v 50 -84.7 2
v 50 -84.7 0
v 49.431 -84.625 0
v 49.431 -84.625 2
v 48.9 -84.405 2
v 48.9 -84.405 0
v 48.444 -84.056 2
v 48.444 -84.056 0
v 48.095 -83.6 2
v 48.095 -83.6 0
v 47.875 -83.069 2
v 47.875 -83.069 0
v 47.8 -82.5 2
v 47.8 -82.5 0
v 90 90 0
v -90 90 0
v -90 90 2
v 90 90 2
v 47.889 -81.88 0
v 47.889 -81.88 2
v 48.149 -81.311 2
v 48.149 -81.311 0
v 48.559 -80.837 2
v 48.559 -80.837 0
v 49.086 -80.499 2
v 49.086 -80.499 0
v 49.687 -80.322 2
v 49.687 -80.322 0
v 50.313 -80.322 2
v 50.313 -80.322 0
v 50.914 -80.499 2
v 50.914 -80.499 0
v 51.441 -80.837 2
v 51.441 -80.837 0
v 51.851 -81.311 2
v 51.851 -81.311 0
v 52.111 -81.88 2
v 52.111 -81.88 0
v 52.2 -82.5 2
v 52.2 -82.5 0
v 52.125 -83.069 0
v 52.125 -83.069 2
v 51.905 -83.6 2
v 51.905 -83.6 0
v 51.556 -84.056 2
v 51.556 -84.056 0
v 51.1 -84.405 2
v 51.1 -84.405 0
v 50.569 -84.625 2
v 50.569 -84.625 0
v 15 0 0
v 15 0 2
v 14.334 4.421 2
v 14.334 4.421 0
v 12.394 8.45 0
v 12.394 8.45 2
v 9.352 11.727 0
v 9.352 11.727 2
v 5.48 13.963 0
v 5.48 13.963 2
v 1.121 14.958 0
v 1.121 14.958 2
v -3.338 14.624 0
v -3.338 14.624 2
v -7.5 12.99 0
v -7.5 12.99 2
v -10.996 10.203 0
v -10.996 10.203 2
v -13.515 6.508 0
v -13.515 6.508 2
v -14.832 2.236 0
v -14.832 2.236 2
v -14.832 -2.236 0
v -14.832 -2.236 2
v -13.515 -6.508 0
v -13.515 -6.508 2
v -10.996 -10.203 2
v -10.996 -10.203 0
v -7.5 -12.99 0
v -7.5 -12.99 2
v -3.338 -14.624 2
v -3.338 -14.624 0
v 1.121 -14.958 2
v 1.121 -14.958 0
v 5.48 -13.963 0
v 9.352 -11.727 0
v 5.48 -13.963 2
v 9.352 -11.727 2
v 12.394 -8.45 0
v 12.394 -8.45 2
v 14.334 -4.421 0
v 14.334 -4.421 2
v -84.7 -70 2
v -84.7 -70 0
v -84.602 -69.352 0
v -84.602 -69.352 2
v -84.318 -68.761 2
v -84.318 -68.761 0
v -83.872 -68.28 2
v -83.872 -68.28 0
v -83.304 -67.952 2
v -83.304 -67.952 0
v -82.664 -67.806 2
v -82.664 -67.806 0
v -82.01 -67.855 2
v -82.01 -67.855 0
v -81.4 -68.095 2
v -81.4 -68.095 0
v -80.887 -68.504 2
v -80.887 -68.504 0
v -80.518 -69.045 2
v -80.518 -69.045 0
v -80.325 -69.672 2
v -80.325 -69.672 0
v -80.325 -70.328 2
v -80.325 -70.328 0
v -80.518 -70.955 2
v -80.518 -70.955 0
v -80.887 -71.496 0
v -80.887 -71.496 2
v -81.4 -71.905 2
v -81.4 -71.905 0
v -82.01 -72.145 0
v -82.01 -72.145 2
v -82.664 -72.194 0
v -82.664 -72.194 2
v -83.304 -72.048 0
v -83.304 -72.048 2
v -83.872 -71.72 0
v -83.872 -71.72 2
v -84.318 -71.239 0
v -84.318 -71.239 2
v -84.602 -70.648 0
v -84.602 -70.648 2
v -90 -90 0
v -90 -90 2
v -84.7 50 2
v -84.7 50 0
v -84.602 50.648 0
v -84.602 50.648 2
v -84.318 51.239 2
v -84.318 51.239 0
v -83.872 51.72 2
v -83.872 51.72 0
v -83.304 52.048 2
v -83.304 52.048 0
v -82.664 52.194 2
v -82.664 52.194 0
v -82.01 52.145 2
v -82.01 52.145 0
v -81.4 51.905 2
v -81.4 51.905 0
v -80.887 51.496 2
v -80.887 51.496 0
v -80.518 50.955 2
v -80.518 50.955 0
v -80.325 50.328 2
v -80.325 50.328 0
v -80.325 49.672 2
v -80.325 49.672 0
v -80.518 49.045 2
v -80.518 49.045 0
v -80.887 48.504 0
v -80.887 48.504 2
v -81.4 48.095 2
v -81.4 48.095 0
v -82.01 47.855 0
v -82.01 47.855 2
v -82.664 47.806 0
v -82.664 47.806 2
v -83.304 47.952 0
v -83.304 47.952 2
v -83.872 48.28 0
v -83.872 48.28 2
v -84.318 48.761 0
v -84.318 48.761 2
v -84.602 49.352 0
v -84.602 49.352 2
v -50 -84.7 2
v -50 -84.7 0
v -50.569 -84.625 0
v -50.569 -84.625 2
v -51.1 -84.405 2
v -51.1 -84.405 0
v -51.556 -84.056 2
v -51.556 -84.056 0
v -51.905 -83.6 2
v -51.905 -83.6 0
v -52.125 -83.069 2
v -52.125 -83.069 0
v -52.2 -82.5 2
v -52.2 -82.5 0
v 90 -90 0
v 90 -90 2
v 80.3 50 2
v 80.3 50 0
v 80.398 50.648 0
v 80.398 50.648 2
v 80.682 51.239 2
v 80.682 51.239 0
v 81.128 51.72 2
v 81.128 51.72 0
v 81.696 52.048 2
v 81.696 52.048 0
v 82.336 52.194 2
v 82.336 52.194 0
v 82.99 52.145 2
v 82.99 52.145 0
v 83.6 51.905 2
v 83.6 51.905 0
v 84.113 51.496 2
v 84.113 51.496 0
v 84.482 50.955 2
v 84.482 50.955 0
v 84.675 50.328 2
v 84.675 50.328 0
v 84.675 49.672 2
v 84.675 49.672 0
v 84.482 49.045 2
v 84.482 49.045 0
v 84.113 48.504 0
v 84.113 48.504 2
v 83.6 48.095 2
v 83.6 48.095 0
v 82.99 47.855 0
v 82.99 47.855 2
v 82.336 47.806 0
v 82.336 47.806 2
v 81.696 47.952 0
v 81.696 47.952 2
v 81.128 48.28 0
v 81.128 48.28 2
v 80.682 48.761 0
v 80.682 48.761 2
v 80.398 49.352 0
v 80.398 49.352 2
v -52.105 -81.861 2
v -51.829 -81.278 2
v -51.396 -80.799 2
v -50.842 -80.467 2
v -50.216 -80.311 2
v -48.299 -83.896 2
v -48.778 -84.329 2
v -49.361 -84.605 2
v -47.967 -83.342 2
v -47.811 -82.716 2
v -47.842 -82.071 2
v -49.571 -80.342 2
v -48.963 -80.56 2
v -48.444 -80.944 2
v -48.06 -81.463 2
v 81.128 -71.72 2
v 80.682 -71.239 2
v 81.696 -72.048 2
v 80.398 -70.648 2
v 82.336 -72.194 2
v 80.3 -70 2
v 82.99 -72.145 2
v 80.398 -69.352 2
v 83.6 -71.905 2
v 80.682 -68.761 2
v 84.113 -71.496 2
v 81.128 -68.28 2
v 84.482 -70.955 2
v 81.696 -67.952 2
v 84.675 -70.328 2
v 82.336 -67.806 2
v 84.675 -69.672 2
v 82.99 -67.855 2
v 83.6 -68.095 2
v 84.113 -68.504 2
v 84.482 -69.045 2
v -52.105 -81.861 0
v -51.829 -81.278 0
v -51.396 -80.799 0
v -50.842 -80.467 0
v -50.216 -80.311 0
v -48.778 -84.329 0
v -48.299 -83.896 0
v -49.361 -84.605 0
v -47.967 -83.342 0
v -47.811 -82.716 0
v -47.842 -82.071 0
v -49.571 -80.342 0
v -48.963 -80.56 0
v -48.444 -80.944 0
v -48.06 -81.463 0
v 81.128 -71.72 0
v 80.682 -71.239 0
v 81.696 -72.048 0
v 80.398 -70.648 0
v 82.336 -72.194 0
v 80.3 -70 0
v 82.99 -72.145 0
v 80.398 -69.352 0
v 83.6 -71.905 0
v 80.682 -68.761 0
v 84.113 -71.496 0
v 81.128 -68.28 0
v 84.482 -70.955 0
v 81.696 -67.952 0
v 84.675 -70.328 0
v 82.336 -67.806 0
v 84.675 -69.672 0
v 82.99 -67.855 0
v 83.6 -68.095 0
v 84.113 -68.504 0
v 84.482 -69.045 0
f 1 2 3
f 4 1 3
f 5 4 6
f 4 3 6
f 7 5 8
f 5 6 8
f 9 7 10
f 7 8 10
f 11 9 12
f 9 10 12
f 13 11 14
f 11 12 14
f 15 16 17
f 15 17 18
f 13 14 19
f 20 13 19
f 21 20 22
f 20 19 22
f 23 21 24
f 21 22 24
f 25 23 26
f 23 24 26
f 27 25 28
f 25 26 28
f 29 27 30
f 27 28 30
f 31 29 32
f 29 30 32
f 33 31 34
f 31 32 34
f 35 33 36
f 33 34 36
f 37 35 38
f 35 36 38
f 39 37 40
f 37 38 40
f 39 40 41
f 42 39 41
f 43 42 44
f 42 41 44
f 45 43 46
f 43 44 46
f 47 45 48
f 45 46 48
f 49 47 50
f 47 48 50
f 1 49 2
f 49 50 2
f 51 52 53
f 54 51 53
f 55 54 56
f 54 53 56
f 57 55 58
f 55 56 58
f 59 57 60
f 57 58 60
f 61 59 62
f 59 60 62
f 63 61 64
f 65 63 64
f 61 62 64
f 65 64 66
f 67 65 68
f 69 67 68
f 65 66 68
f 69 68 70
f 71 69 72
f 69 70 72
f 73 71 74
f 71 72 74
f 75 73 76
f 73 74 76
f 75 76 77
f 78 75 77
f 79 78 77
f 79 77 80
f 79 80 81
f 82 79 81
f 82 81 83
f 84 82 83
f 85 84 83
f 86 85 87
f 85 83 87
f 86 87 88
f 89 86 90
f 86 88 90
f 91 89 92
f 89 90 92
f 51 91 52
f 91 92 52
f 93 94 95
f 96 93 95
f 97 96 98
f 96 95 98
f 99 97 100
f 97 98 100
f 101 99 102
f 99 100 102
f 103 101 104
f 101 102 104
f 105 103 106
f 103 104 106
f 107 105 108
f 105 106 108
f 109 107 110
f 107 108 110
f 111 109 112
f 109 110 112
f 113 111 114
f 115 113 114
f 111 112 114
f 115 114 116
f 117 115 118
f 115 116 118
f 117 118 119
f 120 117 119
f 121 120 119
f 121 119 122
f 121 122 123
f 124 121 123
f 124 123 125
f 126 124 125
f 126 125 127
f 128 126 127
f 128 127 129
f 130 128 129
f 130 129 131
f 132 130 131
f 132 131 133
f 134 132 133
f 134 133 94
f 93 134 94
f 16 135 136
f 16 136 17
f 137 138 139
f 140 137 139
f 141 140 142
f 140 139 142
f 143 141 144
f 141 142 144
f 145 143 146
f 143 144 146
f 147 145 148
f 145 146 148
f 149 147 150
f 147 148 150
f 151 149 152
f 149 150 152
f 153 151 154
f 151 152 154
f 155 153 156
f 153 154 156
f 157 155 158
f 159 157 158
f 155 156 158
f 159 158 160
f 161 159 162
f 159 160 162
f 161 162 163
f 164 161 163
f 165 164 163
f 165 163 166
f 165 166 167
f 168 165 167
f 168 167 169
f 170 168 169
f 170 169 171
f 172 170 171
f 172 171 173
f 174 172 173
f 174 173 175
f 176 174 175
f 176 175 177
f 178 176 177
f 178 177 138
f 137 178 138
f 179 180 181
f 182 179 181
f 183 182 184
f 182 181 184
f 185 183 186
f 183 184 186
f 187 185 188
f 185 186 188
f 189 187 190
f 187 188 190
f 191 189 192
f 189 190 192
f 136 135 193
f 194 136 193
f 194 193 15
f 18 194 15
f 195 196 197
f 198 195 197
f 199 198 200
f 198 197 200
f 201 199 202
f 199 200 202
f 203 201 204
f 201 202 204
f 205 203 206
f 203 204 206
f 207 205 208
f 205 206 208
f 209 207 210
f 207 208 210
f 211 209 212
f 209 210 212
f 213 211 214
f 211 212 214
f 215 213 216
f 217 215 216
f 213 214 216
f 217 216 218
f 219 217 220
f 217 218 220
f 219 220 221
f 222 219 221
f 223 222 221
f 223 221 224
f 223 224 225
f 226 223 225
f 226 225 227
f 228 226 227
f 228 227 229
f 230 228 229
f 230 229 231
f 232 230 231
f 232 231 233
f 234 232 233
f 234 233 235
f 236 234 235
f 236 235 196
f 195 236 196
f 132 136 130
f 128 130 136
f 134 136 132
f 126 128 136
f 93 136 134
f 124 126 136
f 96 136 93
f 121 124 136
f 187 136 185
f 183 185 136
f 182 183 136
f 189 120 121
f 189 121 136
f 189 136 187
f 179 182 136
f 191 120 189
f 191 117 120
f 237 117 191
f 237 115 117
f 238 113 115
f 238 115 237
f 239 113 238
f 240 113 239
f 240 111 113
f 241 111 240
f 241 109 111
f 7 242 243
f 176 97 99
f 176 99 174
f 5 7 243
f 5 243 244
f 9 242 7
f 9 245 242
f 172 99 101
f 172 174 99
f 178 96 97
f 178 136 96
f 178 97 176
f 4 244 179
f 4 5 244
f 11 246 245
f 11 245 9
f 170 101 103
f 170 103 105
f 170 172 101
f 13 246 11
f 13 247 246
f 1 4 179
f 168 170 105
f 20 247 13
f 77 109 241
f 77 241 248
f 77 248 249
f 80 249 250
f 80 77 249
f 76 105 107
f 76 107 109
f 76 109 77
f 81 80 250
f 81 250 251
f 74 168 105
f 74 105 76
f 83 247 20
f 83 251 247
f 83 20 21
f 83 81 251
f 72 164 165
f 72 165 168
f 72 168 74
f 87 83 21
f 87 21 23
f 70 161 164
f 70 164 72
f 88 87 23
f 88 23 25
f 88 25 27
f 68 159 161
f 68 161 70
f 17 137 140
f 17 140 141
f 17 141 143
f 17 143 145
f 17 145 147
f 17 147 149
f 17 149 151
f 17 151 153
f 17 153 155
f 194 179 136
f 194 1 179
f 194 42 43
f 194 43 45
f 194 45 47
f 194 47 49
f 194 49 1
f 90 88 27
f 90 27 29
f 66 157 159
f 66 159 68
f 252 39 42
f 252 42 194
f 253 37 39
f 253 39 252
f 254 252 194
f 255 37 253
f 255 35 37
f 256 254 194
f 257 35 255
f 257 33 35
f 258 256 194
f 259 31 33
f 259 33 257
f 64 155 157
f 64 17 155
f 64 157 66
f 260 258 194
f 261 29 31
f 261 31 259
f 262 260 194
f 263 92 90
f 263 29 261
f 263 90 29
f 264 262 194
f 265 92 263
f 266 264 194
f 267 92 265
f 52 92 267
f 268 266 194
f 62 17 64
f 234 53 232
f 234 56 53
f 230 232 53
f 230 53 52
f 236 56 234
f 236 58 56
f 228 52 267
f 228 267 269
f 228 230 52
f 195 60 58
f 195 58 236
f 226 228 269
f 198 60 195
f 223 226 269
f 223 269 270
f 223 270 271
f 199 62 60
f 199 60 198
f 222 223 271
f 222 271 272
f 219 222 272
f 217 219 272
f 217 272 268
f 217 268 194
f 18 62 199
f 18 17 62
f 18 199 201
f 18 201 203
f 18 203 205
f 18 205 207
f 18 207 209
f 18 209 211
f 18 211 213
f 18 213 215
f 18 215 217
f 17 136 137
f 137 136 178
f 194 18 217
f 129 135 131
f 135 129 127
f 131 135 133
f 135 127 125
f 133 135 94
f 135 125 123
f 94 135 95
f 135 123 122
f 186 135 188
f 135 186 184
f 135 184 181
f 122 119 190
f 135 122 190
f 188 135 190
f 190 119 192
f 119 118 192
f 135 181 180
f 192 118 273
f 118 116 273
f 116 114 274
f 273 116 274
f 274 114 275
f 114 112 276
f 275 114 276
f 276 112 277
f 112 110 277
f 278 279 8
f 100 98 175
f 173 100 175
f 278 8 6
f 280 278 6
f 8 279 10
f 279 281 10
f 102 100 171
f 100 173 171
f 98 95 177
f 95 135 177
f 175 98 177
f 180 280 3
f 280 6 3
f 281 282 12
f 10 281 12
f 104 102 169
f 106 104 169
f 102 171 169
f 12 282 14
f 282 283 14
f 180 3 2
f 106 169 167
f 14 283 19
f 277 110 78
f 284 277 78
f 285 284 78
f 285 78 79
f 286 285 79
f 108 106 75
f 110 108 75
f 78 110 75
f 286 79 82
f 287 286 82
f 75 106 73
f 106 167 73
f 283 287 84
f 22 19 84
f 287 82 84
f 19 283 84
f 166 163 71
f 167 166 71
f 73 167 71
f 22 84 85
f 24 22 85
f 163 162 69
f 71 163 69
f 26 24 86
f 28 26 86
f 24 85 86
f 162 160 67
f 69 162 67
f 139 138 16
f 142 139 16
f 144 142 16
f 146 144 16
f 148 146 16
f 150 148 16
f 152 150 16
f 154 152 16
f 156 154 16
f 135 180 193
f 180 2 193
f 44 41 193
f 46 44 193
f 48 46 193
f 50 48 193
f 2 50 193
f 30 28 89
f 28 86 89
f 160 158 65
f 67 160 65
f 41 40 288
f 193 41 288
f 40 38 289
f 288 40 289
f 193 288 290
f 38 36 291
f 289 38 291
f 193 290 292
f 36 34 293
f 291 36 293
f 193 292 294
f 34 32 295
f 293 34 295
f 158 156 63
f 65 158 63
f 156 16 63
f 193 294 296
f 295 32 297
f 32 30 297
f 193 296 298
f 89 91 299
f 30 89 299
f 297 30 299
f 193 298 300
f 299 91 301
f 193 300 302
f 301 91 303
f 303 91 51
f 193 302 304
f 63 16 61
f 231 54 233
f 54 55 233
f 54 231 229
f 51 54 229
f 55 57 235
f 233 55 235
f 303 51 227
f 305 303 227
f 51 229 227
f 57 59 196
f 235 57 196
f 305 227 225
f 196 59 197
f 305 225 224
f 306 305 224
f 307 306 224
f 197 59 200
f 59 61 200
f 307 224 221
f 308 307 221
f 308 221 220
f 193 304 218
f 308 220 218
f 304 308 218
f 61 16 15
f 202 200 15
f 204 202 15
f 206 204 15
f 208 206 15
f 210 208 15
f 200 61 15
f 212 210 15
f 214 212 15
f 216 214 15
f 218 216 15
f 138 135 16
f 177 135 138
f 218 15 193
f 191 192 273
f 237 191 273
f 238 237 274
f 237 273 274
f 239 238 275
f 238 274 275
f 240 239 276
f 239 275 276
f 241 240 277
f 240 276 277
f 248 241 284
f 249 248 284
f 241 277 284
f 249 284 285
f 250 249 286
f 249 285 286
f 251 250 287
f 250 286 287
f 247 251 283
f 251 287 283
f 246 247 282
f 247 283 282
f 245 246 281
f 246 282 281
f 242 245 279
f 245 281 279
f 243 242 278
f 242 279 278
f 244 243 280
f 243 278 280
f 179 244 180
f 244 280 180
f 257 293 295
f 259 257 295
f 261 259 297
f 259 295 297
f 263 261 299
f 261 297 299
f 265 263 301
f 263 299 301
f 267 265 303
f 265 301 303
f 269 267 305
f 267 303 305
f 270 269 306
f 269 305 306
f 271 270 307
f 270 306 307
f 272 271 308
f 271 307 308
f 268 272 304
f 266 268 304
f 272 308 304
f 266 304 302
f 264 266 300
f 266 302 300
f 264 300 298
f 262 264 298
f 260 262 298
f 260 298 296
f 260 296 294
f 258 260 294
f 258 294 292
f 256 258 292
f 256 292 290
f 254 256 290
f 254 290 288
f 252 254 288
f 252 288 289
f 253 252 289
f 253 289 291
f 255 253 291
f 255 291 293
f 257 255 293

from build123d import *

# Parameters (mm, degrees)
SKETCH_1_W          = 180
SKETCH_1_H          = 180
EXTRUDE_1_DEPTH     = 2
SKETCH_2_R          = 15
CUT_EXTRUDE_1_DEPTH = 2
CUT_EXTRUDE_2_DEPTH = 3
SKETCH_4_R          = 2.2
CUT_EXTRUDE_3_DEPTH = 160


with BuildPart() as part:
    # ｽｹｯﾁ1 → ﾎﾞｽ - 押し出し1 (new body)
    with BuildSketch(Plane.XY):
        Rectangle(SKETCH_1_W, SKETCH_1_H)
    extrude(amount=EXTRUDE_1_DEPTH)

    # ｽｹｯﾁ2 → ｶｯﾄ - 押し出し1 (cut)
    with BuildSketch(Plane.XY.offset(2)):
        Circle(SKETCH_2_R)
    extrude(amount=-CUT_EXTRUDE_1_DEPTH, mode=Mode.SUBTRACT)

    # ｽｹｯﾁ3 → ｶｯﾄ - 押し出し2 (cut, through all)
    with BuildSketch(Plane(origin=(0, 0, 0), x_dir=(-1, 0, 0), z_dir=(0, 0, -1))):
        with BuildLine():
            ThreePointArc((-52.2, -82.5), (-51.555634919, -84.055634919), (-50, -84.7))
            Line((-50, -84.7), (-50, -82.5))
            Line((-50, -82.5), (-52.2, -82.5))
        make_face()
        with BuildLine():
            Line((-50, -82.5), (-50, -84.7))
            ThreePointArc((-50, -84.7), (-48.444365081, -84.055634919), (-47.8, -82.5))
            ThreePointArc((-47.8, -82.5), (-50, -80.3), (-52.2, -82.5))
            Line((-52.2, -82.5), (-50, -82.5))
        make_face()
        with BuildLine():
            ThreePointArc((52.2, -82.5), (48.444365081, -80.944365081), (50, -84.7))
            Line((50, -84.7), (50, -82.5))
            Line((50, -82.5), (52.2, -82.5))
        make_face()
        with BuildLine():
            Line((50, -82.5), (50, -84.7))
            ThreePointArc((50, -84.7), (51.555634919, -84.055634919), (52.2, -82.5))
            Line((52.2, -82.5), (50, -82.5))
        make_face()
    extrude(amount=-CUT_EXTRUDE_2_DEPTH, mode=Mode.SUBTRACT)

    # ｽｹｯﾁ4 → ｶｯﾄ - 押し出し3 (cut)
    with BuildSketch(Plane(origin=(0, 0, 0), x_dir=(-1, 0, 0), z_dir=(0, 0, -1))):
        with Locations((-82.5, -70)):
            Circle(SKETCH_4_R)
        with Locations((-82.5, 50)):
            Circle(SKETCH_4_R)
        with Locations((82.5, 50)):
            Circle(SKETCH_4_R)
        with Locations((82.5, -70)):
            Circle(SKETCH_4_R)
    extrude(amount=-CUT_EXTRUDE_3_DEPTH, mode=Mode.SUBTRACT)


solid = part.part
